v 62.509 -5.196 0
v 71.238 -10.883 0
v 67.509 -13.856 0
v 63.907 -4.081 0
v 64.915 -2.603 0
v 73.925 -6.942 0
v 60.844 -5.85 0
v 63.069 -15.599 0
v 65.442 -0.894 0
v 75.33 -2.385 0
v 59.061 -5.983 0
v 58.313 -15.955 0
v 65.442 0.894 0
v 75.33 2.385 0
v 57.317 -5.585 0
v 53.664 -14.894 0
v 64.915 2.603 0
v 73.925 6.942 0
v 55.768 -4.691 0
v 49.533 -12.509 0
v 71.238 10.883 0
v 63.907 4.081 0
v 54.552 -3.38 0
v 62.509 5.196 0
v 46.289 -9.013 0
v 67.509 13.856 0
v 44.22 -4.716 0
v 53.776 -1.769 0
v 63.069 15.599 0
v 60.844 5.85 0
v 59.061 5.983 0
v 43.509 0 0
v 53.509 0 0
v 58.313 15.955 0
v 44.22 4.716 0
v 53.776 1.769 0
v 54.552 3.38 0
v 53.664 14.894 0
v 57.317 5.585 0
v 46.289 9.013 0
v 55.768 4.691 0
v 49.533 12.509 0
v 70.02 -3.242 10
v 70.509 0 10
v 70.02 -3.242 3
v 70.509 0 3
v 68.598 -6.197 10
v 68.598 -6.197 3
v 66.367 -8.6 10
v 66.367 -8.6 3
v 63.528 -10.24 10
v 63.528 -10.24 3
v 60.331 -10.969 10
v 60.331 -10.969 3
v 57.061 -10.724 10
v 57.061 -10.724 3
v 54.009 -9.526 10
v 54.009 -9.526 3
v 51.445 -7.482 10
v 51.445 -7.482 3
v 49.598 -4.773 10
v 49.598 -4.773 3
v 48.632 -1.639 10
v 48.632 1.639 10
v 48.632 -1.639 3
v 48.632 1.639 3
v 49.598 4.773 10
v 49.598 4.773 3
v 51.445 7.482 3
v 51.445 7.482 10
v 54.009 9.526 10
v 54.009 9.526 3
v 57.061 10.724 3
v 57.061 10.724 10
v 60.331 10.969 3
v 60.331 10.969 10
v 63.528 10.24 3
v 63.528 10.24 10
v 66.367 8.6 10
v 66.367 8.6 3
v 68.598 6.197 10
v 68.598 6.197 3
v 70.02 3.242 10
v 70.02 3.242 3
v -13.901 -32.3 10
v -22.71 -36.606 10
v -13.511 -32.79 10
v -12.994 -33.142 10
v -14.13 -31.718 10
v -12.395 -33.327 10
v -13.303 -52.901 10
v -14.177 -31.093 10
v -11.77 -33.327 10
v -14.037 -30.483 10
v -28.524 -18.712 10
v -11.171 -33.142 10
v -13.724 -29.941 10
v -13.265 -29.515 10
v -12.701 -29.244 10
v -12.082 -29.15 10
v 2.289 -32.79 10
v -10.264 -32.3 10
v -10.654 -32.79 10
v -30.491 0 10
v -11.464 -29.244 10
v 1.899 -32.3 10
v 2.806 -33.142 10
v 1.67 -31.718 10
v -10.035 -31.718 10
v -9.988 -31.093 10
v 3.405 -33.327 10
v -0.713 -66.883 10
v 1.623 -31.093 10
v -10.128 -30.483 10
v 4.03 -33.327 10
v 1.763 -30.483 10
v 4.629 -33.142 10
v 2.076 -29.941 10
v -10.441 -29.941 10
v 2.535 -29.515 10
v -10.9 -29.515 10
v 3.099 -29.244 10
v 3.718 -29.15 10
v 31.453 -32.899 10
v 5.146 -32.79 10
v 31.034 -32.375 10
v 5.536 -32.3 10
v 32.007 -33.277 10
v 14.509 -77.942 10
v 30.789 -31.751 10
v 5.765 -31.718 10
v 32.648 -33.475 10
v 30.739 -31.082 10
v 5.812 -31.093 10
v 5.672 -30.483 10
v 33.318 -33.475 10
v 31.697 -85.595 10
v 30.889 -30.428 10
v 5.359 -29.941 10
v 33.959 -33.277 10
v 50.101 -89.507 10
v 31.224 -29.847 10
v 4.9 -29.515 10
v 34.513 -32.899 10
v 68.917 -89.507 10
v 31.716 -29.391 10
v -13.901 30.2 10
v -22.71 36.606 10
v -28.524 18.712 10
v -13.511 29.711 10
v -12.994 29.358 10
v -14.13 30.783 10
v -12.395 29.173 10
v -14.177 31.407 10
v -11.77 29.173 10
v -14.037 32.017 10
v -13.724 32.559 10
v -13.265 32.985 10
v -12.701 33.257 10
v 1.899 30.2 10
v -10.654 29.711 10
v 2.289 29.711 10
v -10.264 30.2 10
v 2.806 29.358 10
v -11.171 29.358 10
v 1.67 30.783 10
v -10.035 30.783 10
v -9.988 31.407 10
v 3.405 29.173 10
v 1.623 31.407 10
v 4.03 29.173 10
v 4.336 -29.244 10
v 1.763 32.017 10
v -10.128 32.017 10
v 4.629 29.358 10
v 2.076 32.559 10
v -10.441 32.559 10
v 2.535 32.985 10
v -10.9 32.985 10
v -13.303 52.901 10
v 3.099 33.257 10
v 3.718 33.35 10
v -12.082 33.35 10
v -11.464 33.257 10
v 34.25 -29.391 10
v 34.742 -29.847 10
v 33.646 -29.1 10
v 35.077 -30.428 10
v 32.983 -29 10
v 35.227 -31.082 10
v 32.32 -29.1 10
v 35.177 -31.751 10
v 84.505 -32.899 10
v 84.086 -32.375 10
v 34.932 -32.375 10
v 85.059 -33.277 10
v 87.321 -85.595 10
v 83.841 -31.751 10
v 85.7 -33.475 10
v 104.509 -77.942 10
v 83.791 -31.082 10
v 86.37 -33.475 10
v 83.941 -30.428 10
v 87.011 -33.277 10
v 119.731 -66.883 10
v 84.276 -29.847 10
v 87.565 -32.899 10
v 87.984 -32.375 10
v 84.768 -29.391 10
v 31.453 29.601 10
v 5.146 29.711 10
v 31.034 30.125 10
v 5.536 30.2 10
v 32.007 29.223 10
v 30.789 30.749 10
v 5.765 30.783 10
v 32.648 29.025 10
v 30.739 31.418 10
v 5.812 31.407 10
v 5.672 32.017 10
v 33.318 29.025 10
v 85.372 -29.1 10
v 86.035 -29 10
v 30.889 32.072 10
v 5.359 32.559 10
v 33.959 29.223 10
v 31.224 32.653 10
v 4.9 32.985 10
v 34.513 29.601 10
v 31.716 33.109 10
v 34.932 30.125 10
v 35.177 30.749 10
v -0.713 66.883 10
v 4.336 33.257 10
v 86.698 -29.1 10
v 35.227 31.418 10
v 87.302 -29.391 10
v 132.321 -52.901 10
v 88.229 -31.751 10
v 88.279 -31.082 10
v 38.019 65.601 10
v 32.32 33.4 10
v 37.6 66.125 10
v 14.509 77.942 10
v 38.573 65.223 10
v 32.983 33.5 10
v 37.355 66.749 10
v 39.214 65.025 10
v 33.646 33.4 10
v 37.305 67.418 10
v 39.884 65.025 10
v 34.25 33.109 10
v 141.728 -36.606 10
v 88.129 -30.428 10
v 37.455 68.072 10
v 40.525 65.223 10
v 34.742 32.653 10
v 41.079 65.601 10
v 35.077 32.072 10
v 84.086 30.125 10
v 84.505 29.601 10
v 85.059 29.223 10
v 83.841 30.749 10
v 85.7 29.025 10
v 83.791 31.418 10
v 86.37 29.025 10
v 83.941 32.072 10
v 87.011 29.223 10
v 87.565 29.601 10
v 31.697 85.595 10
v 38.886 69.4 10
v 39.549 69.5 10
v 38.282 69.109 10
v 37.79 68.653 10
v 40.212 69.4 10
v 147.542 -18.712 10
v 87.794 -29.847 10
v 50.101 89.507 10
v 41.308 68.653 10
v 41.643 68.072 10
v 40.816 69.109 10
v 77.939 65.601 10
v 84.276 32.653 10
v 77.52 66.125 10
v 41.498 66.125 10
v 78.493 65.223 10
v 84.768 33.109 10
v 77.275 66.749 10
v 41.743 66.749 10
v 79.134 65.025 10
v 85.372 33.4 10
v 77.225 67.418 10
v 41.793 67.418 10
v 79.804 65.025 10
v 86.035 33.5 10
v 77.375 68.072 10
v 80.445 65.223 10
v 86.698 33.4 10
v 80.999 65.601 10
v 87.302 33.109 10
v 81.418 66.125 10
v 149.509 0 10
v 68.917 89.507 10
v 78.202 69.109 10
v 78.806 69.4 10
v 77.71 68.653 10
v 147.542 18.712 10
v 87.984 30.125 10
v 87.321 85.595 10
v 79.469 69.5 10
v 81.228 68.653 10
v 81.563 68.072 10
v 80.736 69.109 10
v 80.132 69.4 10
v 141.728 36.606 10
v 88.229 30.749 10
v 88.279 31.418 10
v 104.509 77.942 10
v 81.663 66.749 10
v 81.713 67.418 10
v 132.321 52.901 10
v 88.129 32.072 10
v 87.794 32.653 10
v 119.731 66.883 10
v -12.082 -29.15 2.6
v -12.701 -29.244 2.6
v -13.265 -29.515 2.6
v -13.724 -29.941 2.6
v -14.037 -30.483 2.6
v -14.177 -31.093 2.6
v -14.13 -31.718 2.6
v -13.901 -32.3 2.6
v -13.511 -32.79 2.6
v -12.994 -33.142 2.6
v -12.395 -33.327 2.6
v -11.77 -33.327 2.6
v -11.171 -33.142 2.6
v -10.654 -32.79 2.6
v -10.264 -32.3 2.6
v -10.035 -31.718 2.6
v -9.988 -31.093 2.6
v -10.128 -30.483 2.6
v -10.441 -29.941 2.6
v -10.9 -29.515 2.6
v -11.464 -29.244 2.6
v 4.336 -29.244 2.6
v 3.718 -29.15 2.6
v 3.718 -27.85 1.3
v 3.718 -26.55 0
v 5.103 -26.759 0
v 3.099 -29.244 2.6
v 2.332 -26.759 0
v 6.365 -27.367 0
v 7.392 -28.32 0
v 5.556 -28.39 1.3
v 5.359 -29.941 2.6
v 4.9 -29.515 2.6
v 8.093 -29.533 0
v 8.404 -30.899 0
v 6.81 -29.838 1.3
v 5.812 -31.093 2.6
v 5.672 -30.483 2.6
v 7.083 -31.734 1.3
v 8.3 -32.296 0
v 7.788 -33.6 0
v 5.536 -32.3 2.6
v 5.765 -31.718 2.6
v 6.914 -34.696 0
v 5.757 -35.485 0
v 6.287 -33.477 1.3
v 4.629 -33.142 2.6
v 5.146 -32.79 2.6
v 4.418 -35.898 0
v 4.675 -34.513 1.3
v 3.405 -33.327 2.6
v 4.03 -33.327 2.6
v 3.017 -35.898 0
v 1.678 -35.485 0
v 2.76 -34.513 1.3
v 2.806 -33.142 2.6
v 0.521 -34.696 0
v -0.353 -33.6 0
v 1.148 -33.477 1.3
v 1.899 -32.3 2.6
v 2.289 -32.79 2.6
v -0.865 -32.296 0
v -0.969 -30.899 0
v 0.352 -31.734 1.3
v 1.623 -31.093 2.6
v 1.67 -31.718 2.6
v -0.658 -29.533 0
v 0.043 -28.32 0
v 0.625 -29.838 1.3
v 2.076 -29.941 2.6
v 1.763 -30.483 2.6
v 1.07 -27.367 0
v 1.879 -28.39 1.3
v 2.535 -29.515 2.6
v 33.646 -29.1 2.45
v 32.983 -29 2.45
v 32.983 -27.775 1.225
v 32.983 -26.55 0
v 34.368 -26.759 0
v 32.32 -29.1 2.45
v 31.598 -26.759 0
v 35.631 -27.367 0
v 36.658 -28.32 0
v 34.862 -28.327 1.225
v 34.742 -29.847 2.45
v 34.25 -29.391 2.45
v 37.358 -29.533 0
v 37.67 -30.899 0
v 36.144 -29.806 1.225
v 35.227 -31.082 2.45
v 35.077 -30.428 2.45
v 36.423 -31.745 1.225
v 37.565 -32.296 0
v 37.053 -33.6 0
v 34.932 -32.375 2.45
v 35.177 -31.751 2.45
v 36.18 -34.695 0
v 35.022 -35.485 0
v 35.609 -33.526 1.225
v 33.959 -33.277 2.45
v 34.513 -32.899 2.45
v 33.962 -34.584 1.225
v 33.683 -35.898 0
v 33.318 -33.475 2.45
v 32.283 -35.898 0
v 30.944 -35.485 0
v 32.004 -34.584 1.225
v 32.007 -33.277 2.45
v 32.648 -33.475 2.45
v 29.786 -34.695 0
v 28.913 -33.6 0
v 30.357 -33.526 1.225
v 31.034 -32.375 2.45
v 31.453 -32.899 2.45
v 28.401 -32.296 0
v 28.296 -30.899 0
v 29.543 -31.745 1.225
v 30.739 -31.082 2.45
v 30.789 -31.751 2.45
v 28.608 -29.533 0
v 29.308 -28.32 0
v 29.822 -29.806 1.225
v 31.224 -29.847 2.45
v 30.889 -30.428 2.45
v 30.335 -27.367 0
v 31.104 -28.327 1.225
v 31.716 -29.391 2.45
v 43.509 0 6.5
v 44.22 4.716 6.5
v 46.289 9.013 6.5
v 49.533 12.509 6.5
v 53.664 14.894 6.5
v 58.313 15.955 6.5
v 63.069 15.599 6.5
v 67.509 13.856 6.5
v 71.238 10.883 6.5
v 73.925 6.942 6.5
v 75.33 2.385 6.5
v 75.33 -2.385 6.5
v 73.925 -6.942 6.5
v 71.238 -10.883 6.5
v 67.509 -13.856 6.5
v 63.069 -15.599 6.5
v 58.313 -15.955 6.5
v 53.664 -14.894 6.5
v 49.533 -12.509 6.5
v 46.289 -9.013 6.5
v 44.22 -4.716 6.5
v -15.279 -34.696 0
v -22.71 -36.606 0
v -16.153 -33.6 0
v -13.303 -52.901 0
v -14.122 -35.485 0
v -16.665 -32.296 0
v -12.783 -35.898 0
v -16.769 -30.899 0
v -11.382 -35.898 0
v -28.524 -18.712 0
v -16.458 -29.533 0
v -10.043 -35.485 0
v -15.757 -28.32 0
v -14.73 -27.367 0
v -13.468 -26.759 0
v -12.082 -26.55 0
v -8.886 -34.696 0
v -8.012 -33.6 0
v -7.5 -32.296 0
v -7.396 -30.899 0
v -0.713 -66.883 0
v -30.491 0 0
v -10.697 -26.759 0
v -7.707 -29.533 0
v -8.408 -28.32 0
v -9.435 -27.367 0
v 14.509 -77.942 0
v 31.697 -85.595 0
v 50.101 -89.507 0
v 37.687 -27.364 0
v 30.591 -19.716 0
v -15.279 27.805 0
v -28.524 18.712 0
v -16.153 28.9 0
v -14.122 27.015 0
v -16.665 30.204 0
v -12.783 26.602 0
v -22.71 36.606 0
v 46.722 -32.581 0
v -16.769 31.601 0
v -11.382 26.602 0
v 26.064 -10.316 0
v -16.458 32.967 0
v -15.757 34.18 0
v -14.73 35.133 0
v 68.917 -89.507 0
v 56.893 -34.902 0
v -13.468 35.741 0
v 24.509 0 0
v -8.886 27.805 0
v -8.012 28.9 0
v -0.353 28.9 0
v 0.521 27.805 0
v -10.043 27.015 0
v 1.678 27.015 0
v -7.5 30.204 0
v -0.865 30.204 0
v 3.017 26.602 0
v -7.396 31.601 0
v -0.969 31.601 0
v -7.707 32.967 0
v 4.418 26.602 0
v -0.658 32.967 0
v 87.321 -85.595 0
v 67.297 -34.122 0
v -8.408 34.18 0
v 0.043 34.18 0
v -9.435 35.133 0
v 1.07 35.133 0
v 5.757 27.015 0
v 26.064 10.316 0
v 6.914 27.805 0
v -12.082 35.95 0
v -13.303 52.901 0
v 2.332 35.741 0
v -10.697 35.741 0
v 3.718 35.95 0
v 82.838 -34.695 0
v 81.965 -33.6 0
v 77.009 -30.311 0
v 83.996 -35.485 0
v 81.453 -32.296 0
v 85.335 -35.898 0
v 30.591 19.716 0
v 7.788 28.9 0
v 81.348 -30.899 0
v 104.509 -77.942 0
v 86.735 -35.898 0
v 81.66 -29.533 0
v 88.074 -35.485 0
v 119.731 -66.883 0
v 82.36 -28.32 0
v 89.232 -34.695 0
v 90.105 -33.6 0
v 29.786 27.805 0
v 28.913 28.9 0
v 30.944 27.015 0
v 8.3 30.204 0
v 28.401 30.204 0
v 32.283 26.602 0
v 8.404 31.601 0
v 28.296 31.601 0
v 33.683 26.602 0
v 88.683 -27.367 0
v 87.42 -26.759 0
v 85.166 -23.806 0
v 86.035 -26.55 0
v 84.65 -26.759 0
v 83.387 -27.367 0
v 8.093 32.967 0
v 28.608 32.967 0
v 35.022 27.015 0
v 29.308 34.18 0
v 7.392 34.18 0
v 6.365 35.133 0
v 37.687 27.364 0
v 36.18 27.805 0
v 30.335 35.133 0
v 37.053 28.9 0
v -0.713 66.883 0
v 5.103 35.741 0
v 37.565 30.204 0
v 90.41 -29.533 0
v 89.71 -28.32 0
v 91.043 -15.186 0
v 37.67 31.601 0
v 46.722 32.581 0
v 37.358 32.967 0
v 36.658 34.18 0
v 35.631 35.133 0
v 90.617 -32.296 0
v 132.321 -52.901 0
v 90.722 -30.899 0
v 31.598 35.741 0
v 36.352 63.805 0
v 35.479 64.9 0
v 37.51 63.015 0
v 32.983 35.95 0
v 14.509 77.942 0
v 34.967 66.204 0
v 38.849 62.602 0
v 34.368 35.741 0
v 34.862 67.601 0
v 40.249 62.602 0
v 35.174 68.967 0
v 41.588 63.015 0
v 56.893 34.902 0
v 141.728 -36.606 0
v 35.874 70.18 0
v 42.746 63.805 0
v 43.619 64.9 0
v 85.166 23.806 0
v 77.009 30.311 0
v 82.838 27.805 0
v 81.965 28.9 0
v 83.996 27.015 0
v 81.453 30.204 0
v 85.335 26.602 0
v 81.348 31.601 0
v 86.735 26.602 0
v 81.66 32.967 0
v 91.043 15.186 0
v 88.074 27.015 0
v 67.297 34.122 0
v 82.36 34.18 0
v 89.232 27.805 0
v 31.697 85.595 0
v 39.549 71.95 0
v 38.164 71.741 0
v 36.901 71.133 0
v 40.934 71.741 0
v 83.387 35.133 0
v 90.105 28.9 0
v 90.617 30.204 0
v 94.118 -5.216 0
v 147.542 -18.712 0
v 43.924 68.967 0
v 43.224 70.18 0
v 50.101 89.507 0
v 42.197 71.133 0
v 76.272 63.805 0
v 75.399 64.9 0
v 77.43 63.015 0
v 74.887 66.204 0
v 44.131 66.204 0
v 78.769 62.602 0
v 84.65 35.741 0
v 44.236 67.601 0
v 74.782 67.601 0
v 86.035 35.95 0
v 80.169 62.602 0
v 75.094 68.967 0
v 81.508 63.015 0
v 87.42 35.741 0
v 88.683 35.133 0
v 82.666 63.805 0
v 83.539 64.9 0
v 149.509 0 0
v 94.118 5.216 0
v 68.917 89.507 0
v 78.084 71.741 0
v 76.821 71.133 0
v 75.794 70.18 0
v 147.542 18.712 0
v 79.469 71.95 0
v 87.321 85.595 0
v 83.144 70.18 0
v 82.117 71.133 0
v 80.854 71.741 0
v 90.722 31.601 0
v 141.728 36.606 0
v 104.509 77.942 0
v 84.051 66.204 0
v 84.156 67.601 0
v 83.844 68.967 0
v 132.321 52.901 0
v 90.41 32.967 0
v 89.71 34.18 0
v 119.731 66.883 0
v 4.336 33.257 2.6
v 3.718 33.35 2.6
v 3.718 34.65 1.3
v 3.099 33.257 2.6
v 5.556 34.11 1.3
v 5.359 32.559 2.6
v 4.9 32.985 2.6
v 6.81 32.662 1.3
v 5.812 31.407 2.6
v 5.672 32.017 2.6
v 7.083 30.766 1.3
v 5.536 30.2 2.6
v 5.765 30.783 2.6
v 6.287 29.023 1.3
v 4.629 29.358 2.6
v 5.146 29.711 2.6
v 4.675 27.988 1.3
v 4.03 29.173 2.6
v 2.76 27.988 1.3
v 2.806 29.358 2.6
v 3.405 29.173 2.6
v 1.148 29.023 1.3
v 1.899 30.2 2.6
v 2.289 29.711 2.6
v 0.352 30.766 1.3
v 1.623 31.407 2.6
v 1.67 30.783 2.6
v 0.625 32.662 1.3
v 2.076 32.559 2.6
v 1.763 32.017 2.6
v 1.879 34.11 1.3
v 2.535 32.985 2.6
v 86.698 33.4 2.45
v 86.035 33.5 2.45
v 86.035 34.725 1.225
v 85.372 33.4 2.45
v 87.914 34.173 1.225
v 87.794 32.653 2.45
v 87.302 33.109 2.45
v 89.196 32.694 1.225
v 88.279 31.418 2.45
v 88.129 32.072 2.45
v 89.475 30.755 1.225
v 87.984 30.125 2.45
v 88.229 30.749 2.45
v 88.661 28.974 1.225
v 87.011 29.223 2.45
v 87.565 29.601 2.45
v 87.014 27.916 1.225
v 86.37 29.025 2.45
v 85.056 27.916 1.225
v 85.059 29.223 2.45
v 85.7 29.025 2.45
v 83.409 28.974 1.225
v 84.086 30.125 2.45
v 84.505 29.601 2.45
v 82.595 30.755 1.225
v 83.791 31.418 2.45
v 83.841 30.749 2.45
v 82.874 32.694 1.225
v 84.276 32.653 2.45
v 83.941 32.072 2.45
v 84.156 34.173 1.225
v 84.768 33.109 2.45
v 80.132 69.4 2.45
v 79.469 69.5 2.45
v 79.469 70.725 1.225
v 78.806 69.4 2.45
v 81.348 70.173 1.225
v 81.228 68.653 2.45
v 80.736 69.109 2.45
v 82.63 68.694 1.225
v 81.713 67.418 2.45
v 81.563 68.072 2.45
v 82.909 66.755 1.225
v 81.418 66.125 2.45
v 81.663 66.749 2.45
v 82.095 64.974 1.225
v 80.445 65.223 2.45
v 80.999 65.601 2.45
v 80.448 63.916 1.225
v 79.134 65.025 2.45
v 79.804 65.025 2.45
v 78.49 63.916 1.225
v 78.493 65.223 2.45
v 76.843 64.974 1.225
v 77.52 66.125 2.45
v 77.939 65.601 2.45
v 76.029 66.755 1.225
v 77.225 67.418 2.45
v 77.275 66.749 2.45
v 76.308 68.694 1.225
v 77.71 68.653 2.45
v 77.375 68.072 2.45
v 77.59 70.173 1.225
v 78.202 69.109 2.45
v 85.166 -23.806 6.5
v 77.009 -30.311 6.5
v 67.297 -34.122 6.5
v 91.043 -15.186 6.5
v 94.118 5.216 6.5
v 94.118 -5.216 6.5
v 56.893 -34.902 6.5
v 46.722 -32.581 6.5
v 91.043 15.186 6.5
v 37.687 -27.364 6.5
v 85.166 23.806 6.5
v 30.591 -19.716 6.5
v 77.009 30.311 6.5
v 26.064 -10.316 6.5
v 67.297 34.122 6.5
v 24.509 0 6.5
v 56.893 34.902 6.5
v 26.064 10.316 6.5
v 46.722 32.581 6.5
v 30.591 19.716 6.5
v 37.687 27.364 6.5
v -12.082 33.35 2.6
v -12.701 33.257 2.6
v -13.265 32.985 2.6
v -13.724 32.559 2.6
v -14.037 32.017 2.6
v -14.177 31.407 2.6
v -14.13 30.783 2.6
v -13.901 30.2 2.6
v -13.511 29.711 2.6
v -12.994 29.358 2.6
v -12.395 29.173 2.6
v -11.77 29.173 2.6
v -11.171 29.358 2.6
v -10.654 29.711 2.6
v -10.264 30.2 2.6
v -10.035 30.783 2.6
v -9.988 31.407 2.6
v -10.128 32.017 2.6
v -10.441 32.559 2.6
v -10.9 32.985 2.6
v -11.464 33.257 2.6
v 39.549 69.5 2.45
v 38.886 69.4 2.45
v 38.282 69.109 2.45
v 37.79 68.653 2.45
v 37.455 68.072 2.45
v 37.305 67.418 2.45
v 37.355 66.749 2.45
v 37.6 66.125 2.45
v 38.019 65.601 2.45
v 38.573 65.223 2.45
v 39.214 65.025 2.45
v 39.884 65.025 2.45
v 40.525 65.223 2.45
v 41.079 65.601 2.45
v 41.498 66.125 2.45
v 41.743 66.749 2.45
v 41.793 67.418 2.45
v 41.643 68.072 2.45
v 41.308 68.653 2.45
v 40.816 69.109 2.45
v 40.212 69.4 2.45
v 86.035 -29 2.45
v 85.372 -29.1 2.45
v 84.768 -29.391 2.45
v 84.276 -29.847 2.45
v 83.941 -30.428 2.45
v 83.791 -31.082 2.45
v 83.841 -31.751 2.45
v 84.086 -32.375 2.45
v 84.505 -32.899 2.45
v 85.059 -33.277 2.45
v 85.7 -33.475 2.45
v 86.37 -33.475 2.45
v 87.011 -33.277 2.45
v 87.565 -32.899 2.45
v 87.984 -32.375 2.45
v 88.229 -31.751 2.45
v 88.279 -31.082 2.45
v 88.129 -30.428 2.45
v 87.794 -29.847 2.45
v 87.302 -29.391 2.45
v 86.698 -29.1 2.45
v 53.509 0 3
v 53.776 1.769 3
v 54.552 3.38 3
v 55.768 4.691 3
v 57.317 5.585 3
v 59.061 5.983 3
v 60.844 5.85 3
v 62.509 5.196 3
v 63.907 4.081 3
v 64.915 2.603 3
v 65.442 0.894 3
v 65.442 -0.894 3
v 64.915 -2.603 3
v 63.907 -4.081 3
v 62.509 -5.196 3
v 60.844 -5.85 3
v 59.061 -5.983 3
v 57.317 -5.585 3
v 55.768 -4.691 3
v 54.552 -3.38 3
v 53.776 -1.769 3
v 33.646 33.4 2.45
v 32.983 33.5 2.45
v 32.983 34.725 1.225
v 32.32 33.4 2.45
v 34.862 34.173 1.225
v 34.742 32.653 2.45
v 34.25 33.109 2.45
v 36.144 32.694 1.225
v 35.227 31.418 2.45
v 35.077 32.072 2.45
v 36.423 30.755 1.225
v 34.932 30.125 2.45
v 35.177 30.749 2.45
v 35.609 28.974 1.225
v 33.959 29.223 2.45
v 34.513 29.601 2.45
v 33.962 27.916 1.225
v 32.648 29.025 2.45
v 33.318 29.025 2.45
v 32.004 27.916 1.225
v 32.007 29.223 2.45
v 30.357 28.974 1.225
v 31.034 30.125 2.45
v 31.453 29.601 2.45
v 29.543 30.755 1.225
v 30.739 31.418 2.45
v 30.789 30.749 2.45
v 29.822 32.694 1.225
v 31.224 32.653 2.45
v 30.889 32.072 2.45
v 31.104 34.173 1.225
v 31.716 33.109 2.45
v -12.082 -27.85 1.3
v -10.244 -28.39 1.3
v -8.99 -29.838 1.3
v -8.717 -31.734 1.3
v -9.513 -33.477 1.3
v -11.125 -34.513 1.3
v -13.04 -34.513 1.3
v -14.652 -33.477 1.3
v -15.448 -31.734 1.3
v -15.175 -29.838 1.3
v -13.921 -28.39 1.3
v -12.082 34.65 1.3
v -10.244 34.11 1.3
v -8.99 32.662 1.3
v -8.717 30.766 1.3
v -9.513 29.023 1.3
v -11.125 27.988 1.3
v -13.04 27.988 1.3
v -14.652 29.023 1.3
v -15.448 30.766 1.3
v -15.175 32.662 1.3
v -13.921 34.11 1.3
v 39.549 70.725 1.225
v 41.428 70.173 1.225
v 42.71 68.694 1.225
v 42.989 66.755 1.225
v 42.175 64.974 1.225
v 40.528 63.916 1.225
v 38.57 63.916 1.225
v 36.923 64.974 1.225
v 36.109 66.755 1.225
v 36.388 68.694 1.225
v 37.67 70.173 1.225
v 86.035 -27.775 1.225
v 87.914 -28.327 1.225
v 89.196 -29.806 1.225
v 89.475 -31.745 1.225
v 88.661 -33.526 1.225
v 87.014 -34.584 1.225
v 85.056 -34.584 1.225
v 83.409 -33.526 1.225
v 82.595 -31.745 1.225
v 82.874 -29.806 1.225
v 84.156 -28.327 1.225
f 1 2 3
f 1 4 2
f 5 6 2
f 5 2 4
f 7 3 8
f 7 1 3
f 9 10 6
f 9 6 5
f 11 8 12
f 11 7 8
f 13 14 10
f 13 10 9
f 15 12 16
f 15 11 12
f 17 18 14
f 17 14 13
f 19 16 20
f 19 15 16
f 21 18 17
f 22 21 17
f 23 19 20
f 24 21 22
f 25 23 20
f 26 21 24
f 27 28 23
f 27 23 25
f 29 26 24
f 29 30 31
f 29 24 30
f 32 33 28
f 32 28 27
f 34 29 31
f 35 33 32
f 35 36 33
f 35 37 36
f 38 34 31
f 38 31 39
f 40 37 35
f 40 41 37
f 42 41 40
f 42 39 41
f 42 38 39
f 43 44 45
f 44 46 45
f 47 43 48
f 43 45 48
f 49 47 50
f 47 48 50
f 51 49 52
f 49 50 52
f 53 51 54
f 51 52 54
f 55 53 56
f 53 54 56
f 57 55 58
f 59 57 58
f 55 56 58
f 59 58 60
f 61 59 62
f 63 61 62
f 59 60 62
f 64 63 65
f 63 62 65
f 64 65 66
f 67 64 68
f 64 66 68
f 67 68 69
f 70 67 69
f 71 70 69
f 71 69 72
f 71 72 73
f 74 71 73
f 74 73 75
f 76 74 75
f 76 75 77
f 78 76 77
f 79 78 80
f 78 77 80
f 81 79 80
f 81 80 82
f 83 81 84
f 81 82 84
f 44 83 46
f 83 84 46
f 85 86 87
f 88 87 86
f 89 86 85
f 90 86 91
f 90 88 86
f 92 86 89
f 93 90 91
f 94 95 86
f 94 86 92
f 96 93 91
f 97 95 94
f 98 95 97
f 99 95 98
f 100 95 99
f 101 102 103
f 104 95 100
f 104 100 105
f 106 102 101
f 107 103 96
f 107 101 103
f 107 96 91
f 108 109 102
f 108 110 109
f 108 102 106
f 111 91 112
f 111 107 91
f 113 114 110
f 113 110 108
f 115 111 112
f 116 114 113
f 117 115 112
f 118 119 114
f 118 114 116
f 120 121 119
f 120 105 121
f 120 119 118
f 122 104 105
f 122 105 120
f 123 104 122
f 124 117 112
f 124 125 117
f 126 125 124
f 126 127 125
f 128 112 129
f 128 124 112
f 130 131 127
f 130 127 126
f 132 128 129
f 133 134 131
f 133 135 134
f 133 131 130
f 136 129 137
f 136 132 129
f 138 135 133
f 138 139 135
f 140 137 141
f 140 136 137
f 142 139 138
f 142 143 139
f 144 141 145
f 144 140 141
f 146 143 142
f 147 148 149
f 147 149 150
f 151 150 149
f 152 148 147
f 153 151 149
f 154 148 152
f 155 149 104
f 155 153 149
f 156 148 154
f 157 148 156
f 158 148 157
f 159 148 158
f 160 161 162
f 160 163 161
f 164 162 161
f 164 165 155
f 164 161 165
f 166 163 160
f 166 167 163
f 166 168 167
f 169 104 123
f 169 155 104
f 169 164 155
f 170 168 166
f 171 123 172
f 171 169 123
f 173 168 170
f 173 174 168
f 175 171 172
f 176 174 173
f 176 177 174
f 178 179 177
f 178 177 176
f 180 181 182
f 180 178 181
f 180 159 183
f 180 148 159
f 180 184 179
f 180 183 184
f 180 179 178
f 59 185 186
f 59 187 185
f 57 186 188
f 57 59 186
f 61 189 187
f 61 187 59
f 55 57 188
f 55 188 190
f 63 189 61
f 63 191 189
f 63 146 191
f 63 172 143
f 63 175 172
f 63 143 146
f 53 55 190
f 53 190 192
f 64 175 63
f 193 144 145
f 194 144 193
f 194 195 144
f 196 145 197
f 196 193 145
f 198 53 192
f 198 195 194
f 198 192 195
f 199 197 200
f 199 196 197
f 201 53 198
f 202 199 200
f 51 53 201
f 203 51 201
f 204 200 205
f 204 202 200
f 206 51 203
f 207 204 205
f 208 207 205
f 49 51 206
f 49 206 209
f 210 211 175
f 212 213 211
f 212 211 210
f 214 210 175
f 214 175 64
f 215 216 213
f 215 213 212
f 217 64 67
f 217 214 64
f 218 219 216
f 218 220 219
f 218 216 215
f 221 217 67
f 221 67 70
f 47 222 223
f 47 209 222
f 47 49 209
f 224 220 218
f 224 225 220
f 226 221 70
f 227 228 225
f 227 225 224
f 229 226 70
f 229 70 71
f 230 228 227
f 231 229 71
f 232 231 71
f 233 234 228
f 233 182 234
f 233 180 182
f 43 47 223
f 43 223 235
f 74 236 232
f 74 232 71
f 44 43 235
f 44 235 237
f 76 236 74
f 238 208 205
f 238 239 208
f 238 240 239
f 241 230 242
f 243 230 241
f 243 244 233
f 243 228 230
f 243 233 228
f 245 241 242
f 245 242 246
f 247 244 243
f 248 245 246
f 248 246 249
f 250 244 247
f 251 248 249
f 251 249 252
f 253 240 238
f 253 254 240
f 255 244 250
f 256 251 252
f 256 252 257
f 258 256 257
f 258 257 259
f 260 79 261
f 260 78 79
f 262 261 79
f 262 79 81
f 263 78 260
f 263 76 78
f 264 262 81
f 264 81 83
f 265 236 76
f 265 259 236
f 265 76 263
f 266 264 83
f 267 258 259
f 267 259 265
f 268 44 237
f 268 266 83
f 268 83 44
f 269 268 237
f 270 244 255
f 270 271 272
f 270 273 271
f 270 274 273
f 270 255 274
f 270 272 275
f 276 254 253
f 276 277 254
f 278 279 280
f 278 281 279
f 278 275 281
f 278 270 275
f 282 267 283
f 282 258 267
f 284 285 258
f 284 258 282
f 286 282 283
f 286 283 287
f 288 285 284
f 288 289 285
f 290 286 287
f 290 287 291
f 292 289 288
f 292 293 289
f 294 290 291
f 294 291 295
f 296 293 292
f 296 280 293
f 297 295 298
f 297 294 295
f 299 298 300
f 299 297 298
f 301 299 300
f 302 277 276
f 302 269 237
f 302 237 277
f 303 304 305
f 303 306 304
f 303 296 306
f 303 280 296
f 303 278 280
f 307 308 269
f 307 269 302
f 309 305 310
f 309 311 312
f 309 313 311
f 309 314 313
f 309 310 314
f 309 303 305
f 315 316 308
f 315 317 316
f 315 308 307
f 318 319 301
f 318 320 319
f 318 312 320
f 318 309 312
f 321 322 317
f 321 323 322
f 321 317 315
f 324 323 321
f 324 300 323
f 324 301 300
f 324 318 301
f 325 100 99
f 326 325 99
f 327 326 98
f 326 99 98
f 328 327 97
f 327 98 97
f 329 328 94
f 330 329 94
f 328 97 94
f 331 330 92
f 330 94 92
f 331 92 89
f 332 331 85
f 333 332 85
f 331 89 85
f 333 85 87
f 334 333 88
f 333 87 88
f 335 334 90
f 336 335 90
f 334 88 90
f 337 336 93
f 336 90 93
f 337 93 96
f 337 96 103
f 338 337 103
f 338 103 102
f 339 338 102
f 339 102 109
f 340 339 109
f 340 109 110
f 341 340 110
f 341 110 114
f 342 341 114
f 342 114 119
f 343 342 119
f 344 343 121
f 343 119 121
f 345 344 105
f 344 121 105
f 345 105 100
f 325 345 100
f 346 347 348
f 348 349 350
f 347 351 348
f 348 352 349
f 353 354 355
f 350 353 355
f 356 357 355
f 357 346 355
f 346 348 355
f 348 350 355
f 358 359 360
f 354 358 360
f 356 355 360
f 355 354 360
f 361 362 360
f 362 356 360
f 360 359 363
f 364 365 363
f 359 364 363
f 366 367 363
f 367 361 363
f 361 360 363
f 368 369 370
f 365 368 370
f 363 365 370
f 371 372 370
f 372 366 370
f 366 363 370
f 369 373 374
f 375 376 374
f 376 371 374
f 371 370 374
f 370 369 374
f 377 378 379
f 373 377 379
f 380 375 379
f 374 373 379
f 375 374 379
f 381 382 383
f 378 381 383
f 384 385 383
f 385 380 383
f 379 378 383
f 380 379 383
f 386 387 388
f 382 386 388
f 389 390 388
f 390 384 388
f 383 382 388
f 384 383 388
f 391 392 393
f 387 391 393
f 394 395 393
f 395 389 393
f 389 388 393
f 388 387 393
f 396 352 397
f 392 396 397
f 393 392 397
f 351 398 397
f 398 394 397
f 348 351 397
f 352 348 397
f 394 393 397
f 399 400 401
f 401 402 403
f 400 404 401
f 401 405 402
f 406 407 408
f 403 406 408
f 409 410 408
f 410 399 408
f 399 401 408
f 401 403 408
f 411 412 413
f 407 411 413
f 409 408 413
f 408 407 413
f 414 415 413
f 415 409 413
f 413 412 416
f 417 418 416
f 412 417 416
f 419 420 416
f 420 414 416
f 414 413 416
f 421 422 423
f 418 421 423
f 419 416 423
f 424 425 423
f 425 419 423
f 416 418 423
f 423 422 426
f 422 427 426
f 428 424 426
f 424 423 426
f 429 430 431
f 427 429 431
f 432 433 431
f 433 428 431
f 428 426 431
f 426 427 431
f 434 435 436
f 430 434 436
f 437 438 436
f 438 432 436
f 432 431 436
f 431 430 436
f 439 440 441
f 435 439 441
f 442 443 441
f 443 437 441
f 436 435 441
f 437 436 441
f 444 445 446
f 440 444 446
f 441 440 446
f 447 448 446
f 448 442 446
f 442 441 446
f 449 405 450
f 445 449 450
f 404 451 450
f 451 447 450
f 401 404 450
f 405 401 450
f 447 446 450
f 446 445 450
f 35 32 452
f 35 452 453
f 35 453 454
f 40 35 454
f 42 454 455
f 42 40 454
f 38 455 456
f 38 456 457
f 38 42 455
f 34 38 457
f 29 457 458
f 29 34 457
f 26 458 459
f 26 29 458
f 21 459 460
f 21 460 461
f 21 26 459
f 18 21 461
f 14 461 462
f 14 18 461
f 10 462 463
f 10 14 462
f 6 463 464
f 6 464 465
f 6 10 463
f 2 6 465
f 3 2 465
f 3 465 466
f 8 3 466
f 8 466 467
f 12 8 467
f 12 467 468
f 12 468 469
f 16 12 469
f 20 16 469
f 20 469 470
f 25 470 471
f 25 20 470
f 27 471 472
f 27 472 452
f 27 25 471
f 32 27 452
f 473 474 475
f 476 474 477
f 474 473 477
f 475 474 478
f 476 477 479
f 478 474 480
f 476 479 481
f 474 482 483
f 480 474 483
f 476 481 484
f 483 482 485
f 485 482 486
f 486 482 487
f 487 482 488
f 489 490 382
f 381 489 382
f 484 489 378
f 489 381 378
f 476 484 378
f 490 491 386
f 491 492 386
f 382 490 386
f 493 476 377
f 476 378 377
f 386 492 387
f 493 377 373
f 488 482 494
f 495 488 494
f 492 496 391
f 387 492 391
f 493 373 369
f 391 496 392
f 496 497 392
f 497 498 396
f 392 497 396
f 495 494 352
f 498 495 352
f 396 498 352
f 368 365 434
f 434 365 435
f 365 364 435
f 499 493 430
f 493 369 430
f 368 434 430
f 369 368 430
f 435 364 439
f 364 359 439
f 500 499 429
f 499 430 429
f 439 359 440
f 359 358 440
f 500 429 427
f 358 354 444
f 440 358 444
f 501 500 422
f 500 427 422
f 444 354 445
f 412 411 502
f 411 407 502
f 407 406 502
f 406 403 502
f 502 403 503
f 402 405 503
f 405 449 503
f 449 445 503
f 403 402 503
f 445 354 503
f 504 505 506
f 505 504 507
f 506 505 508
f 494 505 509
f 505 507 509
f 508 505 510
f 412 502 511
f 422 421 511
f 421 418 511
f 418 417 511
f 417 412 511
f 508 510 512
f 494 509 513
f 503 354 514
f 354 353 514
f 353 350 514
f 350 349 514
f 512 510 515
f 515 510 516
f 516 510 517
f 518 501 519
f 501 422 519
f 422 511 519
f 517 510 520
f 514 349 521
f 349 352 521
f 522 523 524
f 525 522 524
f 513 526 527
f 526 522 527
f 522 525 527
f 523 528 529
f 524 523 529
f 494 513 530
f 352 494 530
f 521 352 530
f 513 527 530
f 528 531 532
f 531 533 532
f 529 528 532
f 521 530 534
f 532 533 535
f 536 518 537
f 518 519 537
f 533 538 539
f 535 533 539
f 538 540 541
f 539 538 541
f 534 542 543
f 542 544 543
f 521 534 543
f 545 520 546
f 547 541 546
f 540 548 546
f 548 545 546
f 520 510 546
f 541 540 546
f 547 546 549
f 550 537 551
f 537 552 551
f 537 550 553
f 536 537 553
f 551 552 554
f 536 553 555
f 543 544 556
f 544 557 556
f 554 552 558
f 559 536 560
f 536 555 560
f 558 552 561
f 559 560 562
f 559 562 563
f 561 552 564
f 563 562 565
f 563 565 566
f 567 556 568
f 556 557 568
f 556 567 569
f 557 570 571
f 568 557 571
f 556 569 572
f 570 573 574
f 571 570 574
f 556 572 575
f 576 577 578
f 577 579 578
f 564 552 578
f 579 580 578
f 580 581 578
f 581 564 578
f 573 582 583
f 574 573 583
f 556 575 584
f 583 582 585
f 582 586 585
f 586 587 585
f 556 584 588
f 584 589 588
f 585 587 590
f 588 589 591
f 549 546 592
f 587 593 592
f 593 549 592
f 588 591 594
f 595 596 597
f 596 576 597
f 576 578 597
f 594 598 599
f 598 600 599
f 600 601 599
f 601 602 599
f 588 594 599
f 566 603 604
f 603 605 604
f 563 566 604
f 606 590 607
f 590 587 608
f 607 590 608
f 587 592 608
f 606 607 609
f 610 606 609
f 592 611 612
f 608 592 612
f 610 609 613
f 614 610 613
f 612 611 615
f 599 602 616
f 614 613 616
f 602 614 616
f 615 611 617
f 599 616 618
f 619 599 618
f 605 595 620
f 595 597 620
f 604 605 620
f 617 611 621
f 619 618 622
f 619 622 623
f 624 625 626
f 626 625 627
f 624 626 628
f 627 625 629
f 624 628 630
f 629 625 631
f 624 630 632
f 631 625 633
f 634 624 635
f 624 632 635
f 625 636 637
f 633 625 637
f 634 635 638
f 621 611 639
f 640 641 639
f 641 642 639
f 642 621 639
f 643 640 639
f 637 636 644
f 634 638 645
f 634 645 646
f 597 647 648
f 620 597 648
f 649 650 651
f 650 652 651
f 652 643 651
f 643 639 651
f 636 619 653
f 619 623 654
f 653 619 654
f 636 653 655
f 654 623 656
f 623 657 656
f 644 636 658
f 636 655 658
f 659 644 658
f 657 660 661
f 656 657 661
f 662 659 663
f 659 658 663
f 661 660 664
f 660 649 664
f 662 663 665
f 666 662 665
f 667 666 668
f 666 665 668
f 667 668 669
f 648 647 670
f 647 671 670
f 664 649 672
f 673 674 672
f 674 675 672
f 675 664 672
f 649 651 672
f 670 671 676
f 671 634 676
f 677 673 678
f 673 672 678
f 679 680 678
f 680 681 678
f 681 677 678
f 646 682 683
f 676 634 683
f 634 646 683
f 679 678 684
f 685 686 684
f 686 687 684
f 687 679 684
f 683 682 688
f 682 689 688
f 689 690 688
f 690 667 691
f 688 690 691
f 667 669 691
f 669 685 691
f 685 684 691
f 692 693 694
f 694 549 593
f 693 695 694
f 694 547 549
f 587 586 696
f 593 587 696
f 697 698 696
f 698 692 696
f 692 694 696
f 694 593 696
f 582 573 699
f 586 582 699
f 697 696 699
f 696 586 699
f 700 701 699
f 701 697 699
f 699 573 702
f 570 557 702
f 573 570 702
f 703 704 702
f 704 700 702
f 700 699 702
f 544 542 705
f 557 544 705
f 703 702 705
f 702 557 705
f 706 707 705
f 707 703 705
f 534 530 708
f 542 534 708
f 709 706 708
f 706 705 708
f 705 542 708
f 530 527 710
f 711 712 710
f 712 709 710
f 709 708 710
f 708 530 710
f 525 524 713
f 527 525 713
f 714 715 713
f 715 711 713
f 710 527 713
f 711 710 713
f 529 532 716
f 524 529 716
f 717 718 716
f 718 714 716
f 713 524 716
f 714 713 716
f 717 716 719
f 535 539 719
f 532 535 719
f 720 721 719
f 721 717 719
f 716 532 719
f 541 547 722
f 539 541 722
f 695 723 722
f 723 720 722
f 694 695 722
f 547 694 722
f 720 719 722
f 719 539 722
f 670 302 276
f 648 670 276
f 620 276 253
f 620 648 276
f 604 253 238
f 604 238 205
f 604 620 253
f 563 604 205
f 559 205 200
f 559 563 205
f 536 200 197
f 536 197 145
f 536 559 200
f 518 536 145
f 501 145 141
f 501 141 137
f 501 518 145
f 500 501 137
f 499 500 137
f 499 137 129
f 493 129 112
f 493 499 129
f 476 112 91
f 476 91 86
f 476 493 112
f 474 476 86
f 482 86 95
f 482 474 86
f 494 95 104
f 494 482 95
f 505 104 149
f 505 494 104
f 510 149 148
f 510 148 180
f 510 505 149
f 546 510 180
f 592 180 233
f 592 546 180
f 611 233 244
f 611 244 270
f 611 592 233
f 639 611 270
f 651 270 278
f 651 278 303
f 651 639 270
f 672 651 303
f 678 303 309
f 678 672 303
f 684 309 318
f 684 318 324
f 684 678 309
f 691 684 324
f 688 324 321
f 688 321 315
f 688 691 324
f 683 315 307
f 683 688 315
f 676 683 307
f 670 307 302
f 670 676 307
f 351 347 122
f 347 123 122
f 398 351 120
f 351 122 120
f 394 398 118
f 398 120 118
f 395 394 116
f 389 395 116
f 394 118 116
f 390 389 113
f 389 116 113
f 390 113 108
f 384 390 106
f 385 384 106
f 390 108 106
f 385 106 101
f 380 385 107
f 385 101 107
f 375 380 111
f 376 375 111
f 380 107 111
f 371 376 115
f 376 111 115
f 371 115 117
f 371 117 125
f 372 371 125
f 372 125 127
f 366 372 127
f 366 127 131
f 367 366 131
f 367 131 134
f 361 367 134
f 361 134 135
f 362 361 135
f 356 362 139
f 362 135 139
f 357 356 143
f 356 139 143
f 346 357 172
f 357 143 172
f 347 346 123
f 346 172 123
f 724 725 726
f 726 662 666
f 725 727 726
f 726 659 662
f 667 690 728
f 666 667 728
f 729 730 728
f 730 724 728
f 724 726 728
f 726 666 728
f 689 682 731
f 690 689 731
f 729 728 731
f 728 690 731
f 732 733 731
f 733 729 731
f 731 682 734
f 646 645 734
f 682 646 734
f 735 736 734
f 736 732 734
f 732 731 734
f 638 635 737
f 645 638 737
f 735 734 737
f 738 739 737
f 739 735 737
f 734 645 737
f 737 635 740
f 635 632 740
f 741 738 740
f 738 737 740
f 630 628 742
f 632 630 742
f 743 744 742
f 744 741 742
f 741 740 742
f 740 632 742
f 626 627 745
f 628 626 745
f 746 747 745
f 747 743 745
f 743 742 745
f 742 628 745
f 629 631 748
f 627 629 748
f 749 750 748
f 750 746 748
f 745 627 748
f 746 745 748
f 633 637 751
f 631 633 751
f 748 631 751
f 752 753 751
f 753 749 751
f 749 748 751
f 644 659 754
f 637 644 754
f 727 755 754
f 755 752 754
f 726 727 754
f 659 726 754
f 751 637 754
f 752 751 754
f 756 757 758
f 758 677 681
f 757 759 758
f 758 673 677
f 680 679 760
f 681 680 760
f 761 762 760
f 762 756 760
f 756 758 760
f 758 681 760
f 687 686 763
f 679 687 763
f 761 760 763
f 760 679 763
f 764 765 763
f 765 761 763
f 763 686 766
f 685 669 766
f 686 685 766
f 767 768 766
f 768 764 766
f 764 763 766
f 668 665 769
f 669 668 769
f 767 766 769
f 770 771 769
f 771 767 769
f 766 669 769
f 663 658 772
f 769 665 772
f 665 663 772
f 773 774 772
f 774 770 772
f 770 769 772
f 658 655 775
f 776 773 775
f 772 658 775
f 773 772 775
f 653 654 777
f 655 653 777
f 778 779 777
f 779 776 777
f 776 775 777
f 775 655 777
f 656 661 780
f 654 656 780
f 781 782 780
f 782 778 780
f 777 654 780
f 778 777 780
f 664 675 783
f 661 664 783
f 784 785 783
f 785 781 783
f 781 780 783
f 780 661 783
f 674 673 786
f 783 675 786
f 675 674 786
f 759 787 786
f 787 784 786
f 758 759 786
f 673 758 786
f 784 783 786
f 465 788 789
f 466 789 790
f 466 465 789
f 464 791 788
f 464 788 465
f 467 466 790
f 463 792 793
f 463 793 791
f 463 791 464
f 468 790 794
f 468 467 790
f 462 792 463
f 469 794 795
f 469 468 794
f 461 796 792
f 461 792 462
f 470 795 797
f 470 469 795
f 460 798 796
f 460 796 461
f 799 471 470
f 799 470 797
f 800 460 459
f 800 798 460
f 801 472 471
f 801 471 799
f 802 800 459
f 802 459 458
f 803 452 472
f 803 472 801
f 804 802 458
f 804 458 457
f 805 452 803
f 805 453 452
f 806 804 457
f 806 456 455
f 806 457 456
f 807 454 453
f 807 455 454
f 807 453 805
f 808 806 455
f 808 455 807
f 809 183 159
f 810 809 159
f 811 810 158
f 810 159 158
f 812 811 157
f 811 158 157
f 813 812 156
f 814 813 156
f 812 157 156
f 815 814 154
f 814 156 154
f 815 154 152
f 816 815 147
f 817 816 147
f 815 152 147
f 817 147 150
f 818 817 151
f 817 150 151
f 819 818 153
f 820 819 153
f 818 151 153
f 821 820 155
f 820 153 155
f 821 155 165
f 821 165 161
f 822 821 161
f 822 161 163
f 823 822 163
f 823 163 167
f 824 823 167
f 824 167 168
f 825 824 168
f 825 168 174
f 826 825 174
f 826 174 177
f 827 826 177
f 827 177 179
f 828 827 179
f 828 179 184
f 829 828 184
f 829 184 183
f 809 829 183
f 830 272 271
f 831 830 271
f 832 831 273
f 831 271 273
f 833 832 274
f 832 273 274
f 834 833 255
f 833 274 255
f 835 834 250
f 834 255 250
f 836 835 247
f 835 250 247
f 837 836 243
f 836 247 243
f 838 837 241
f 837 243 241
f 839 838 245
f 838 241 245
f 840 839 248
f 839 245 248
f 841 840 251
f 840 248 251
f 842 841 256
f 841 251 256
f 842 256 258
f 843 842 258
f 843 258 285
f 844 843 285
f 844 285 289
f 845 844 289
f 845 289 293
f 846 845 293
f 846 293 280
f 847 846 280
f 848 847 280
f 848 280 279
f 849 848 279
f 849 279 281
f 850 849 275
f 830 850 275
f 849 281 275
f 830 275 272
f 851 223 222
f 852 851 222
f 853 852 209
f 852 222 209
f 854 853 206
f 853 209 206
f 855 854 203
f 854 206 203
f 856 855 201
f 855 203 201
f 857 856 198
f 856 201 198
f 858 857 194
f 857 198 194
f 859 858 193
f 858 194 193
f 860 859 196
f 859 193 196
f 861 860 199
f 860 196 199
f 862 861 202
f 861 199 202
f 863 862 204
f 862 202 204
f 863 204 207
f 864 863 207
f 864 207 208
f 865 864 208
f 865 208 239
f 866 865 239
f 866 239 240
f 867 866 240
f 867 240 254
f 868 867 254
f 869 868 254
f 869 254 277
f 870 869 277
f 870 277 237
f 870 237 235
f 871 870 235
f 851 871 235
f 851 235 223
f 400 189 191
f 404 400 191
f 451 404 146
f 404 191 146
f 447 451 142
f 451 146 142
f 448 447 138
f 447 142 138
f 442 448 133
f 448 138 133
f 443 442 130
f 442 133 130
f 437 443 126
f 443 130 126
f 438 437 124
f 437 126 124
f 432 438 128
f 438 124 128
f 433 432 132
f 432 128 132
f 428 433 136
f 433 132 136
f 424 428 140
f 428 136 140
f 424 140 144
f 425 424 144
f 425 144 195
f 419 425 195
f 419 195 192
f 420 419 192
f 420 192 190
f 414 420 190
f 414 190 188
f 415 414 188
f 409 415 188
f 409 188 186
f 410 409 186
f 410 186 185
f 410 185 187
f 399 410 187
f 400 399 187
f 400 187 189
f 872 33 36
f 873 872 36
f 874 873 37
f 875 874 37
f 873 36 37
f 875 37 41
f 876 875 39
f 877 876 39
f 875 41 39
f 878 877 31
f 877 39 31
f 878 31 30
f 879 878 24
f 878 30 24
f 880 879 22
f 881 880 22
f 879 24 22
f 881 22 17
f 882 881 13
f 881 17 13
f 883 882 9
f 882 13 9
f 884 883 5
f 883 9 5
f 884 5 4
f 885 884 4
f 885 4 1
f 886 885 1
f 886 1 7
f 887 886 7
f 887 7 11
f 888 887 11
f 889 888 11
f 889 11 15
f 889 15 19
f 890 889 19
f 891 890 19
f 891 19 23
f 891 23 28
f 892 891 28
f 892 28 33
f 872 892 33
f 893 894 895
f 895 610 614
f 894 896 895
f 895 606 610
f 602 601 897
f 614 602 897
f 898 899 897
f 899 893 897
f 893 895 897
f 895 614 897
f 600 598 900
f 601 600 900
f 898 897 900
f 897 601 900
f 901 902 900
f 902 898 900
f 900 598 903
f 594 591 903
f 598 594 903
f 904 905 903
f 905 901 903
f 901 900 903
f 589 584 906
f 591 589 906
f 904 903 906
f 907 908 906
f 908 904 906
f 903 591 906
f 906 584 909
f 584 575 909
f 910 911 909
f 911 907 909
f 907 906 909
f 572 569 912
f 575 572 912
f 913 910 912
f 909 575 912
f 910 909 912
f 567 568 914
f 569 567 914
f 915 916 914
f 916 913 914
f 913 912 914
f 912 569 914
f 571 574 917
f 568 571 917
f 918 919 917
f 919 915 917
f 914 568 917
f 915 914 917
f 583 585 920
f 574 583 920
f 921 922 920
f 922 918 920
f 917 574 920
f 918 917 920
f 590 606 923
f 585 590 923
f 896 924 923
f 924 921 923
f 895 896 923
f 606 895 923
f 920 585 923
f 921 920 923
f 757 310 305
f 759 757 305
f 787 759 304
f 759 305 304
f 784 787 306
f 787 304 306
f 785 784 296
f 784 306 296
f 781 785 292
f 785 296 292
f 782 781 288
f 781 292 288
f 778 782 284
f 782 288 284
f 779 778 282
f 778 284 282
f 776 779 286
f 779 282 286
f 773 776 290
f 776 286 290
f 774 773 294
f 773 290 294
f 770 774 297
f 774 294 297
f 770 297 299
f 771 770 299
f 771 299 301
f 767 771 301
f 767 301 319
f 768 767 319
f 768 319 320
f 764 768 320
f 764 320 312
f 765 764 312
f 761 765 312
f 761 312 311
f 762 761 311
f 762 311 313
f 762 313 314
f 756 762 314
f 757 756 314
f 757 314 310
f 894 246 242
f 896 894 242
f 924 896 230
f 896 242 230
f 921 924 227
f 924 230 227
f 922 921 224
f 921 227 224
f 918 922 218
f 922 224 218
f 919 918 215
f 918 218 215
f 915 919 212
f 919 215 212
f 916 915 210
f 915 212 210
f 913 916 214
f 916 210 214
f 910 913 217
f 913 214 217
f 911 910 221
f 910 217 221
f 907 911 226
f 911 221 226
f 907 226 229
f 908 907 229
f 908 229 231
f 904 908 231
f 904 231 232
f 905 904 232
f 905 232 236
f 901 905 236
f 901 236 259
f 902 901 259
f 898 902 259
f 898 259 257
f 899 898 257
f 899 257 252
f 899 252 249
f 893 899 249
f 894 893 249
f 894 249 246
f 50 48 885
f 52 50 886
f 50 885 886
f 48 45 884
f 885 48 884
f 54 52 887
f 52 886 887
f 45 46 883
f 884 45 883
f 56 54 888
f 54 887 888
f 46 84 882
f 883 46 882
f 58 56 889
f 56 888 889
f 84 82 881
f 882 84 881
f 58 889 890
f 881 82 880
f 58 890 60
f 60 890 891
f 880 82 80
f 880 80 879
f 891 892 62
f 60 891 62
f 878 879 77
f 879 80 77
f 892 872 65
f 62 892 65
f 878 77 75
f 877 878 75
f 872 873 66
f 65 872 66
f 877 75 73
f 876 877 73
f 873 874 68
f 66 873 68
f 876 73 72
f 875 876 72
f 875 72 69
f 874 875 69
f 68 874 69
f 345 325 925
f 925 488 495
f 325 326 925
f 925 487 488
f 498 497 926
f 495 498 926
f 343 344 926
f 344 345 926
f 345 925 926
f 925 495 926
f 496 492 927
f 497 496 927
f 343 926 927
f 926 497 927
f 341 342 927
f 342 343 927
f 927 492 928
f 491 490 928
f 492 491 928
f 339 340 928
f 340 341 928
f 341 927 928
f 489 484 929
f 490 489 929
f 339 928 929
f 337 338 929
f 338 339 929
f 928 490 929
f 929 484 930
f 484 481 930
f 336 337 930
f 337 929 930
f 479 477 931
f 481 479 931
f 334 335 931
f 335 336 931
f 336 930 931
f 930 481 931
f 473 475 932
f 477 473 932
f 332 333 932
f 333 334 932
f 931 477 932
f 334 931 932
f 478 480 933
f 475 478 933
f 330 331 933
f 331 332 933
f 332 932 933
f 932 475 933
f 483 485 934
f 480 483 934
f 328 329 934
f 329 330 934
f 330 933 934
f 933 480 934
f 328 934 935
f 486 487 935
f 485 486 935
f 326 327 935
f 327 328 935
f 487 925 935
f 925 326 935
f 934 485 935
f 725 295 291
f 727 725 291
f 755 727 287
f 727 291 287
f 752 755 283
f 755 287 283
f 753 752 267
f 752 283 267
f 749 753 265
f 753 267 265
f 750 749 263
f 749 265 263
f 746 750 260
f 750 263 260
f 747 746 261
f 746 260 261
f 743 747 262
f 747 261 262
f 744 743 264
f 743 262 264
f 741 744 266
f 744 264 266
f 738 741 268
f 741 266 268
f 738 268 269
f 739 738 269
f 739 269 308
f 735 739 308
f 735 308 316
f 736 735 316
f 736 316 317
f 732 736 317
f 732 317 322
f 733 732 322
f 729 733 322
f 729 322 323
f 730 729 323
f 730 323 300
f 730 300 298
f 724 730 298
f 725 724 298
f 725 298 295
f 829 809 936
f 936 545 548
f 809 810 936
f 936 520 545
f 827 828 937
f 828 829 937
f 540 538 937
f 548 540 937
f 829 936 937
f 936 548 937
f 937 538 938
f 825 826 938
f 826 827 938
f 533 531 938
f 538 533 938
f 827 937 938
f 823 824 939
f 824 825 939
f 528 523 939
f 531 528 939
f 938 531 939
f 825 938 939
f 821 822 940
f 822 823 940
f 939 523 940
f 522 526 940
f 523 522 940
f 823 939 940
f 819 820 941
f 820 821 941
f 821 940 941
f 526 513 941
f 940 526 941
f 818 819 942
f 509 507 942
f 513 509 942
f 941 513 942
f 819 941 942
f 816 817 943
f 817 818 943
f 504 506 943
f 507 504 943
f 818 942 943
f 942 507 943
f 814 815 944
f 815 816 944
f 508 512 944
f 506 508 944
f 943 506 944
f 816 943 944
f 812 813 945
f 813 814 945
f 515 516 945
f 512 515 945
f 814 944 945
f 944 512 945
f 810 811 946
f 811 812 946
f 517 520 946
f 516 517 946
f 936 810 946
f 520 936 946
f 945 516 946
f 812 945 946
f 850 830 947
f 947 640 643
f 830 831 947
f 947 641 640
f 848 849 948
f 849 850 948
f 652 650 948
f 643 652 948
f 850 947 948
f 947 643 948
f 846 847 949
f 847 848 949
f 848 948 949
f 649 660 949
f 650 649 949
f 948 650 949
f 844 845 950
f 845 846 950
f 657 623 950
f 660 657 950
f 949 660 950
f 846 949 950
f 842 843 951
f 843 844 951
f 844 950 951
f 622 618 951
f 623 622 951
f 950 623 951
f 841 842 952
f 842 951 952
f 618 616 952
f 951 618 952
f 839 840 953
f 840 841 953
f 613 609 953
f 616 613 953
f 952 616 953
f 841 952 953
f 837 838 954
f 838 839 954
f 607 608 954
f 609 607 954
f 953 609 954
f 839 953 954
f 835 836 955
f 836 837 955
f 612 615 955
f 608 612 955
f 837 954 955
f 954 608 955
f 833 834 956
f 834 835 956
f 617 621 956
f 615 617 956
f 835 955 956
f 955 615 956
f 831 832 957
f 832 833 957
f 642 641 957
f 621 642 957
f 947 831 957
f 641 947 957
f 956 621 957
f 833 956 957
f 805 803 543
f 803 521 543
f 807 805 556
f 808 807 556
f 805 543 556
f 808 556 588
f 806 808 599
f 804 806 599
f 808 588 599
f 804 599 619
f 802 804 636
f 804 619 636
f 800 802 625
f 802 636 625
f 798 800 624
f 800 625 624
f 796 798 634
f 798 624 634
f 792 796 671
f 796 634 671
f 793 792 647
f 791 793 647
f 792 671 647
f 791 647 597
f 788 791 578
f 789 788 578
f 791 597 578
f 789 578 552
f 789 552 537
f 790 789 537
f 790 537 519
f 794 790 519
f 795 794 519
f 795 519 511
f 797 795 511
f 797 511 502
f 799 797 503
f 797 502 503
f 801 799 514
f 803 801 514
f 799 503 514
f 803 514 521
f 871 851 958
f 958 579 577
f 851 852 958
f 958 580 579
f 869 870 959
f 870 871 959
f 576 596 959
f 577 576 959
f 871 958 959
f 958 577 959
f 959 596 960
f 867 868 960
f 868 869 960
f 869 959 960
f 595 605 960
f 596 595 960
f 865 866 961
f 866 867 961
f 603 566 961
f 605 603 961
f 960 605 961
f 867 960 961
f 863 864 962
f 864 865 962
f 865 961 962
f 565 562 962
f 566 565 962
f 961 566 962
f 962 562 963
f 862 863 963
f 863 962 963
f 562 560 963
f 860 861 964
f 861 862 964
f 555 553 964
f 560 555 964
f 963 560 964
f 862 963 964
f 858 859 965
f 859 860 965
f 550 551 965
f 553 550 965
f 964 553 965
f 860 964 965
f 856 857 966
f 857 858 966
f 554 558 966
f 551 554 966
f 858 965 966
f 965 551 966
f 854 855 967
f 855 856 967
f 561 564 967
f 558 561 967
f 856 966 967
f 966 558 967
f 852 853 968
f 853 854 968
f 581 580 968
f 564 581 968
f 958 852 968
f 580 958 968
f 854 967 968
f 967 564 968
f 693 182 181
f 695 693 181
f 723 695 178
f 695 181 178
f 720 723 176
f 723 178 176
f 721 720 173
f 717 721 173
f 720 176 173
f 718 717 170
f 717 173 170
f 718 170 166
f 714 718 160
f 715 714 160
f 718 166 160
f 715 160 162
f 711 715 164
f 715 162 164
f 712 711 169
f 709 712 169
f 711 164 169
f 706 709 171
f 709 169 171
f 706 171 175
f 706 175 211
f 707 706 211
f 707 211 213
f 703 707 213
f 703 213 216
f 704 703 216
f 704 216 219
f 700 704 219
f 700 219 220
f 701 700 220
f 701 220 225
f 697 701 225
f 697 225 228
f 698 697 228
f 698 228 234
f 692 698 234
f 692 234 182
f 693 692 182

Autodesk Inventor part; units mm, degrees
ref_plane "YZ Plane" through (0, 0, 0) normal (1, 0, 0) x (0, 1, 0)
ref_plane "XZ Plane" through (0, 0, 0) normal (0, 1, 0) x (-1, 0, 0)
ref_plane "XY Plane" through (0, 0, 0) normal (0, 0, 1) x (1, 0, 0)
sketch "Sketch1" plane through (0, 0, 0) normal (0, 0, 1) x (1, 0, 0)
  circle A0 centre (-11.3135, -11.3135) radius 2
  circle A1 centre (-11.3135, 11.3135) radius 2
  circle A2 centre (11.3135, 11.3135) radius 2
  circle A3 centre (11.3135, -11.3135) radius 2
  circle A4 centre (-15.3135, 11.3135) radius 2
  circle A5 centre (-7.3135, 11.3135) radius 2
  circle A6 centre (7.3135, 11.3135) radius 2
  circle A7 centre (15.3135, 11.3135) radius 2
  circle A8 centre (15.3135, -11.3135) radius 2
  circle A9 centre (7.3135, -11.3135) radius 2
  circle A10 centre (-7.3135, -11.3135) radius 2
  circle A11 centre (-15.3135, -11.3135) radius 2
  line L0 (-15.3135, 13.3135) -> (-7.3135, 13.3135)
  line L1 (-7.3135, 9.3135) -> (-15.3135, 9.3135)
  line L2 (-15.3135, -9.3135) -> (-7.3135, -9.3135)
  line L3 (-7.3135, -13.3135) -> (-15.3135, -13.3135)
  line L4 (7.3135, -9.3135) -> (15.3135, -9.3135)
  line L5 (15.3135, -13.3135) -> (7.3135, -13.3135)
  line L6 (15.3135, 9.3135) -> (7.3135, 9.3135)
  line L7 (15.3135, 13.3135) -> (7.3135, 13.3135)
  circle A12 centre (0, 0) radius 8.25
  circle A13 centre (5, 0) radius 8.25
  circle A14 centre (-5, 0) radius 8.25
  line L8 (-5, 8.25) -> (5, 8.25)
  line L9 (5, -8.25) -> (-5, -8.25)
  circle A15 centre (0, 0) radius 42.5
  circle A16 centre (59.509, 0) radius 50.7821
  line L10 (-5.9149, 42.0864) -> (52.4415, 50.2878)
  line L11 (-5.9149, -42.0864) -> (52.4415, -50.2878)
  line L12 (-13.25, 0) -> (13.25, 0)
  circle A17 centre (59.509, 0) radius 11
  arc A18 (-5.9149, 42.0864) -> (-5.9149, -42.0864) centre (0, 0) ccw
  line L13 (-42.5, 0) -> (156.5802, 0)
  circle A19 centre (59.509, 0) radius 90
  point P0 (-3.1314, -32.3793)
  point P1 (23.2633, -35.5678)
  point P2 (23.2633, 35.5678)
  point P3 (-2.5, -7.8621)
  point P4 (0, -8.25)
  dimension "d0" = 4
  dimension "d1" = 22.627
  dimension "d2" = 22.627
  dimension "d3" = 11.3135
  dimension "d4" = 11.3135
  dimension "d5" = 4
  dimension "d6" = 4
  dimension "d7" = 4
  dimension "d8" = 4
  dimension "d9" = 4
  dimension "d10" = 4
  dimension "d11" = 4
  dimension "d12" = 4
  dimension "d15" = 16.5
  dimension "d16" = 5
  dimension "d17" = 5
  dimension "d18" = 85
  dimension "d19" = 8
  dimension "d20" = 59.509
  dimension "d21" = 22
  dimension "d24" = 85
  dimension "d116" = 180
extrude "Extrusion1" add sketch "Sketch1" along normal blind 10 contours A0 | A10 L3 A0 | A0 L2 A10 | A10 | A0 A11 L2 | L3 A11 A0 | A11 | A1 | A5 L1 A1 | A1 L0 A5 | A5 | A1 A4 L0 | L1 A4 A1 | A4 | A2 A16 | A7 L6 A2 | A2 L7 A7 | A7 | L7 A16 A15 L13 A13 L6 A7 | A2 A16 L7 | L6 A16 A2 | A16 A2 | A2 A6 L7 A16 | L7 A6 L6 A16 A13 L8 A14 L13 A19 A15 | A16 L6 A6 A2 | A6 | A16 L13 A17 A15 | A15 L10 A16 | A16 L12 A12 A13 | A13 L12 A16 | L13 A17 A16 A15 | A15 A16 L5 A8 L4 A13 L13 | A15 A19 L13 A16 L10 | A13 A16 L12 | A13 A12 L8 | A16 A13 A12 L12 | A16 L11 A15 | A15 A19 L13 A14 L9 A13 A16 L4 A9 L5 | L13 A19 A15 L11 A16 | A13 A14 A12 | A12 L12 A14 A13 | A12 A14 L8 | A12 A13 A14 L12 | A16 A3 L5 | L5 A9 A3 A16 | L9 A12 A13 | A16 A3 A9 L4 | L4 A3 A16 | A14 L12 A13 | A13 L12 A12 A14 | A12 L12 A14 | A12 A14 A13 | A14 A13 L12 | A3 A16 | A3 A8 L5 | A9 | A3 A16 | L12 A12 A14 | L9 A14 A12 | L4 A8 A3 | A13 A14 A12 L12 | A8
sketch "Sketch18" plane through (59.509, 0, 0) normal (0, 0, -1) x (-1, 0, 0)
  circle A0 centre (0, 0) radius 35
  circle A1 centre (0, 0) radius 90 projected
  circle A2 centre (0, 0) radius 11 projected
  circle A3 centre (0, 0) radius 16
  point P0 (59.509, 0)
  dimension "d127" = 70
  dimension "d130" = 5
extrude "Extrusion9" cut sketch "Sketch18" against normal blind 6.5 contours A0 | A2
sketch "Sketch20" plane through (59.509, 0, 0) normal (0, 0, -1) x (-1, 0, 0)
  circle A0 centre (0, 0) radius 11 projected
  circle A1 centre (0, 0) radius 11 projected
  circle A2 centre (0, 0) radius 6
  point P0 (59.509, 0)
  dimension "d136" = 12
extrude "Extrusion11" add sketch "Sketch20" against normal blind 3
sketch "Sketch22" plane through (59.509, 0, 0) normal (0, 0, -1) x (-1, 0, 0)
  circle A0 centre (55.7915, 31.25) radius 1.621 projected
  circle A1 centre (71.5915, 31.25) radius 1.621 projected
  circle A2 centre (71.5915, -31.2504) radius 1.621 projected
  circle A3 centre (55.7915, -31.2504) radius 1.621 projected
  circle A4 centre (71.5915, -31.2504) radius 1.621 projected
  circle A5 centre (55.7915, -31.2504) radius 1.621 projected
  circle A6 centre (71.5915, 31.25) radius 1.621 projected
  circle A7 centre (55.7915, 31.25) radius 1.621 projected
  point P0 (59.509, 0)
hole "Hole4" at (-12.0825, 31.25, 0) at (3.7175, 31.25, 0) at (-12.0825, -31.2504, 0) at (3.7175, -31.2504, 0) direction (0, 0, 1) diameter 4.2 end through all countersink diameter 9.4 countersink angle 90 clearance for "Countersunk Flat Head Screw ISO 2009/7046" size "M4" standard "ISO"
sketch "Sketch23" plane through (59.509, 0, 0) normal (0, 0, -1) x (-1, 0, 0)
  circle A0 centre (-26.526, -31.25) radius 2.4585 projected
  circle A1 centre (26.526, -31.25) radius 2.4585 projected
  circle A2 centre (-26.526, 31.25) radius 1.621 projected
  circle A3 centre (26.526, 31.25) radius 1.621 projected
  circle A4 centre (26.526, -31.25) radius 2.4585 projected
  circle A5 centre (26.526, 31.25) radius 1.621 projected
  circle A6 centre (-26.526, -31.25) radius 2.4585 projected
  circle A7 centre (0, 0) radius 90 projected
  circle A8 centre (0, 0) radius 11 projected
  circle A9 centre (-26.526, 31.25) radius 1.621 projected
  point P0 (59.509, 0)
hole "Hole5" at (86.035, 31.25, 0) at (86.035, -31.25, 0) at (32.983, -31.25, 0) at (32.983, 31.25, 0) direction (0, 0, 1) diameter 4.5 depth 14.2 tip angle 118 countersink diameter 9.4 countersink angle 90 clearance for "Countersunk Flat Head Screw ISO 2009/7046" size "M4" standard "ISO"
sketch "Sketch24" plane through (59.509, 0, 0) normal (0, 0, -1) x (-1, 0, 0)
  circle A0 centre (-19.96, 67.25) radius 1.621 projected
  circle A1 centre (19.96, 67.25) radius 1.621 projected
  circle A2 centre (-19.96, 67.25) radius 2.1
  circle A3 centre (19.96, 67.25) radius 2.1
  point P0 (59.509, 0)
  dimension "d152" = 4.2
  dimension "d153" = 4.2
hole "Hole6" at (79.469, 67.25, 0) at (39.549, 67.25, 0) direction (0, 0, 1) diameter 4.5 depth 15 tip angle 118 countersink diameter 9.4 countersink angle 90 clearance for "Countersunk Flat Head Screw ISO 2009/7046" size "M4" standard "ISO"
equation "\"d2\" = d1"
equation "\"d3\" = 0.5 * d2"
equation "\"d4\" = 0.5 * d1"
equation "\"d5\" = d0"
equation "\"d6\" = d5"
equation "\"d7\" = d6"
equation "\"d8\" = d7"
equation "\"d9\" = d5"
equation "\"d10\" = d9"
equation "\"d11\" = d10"
equation "\"d12\" = d11"
equation "\"d17\" = d16"
properties part number "base bovenkant v2" material "Aluminum 6061"
